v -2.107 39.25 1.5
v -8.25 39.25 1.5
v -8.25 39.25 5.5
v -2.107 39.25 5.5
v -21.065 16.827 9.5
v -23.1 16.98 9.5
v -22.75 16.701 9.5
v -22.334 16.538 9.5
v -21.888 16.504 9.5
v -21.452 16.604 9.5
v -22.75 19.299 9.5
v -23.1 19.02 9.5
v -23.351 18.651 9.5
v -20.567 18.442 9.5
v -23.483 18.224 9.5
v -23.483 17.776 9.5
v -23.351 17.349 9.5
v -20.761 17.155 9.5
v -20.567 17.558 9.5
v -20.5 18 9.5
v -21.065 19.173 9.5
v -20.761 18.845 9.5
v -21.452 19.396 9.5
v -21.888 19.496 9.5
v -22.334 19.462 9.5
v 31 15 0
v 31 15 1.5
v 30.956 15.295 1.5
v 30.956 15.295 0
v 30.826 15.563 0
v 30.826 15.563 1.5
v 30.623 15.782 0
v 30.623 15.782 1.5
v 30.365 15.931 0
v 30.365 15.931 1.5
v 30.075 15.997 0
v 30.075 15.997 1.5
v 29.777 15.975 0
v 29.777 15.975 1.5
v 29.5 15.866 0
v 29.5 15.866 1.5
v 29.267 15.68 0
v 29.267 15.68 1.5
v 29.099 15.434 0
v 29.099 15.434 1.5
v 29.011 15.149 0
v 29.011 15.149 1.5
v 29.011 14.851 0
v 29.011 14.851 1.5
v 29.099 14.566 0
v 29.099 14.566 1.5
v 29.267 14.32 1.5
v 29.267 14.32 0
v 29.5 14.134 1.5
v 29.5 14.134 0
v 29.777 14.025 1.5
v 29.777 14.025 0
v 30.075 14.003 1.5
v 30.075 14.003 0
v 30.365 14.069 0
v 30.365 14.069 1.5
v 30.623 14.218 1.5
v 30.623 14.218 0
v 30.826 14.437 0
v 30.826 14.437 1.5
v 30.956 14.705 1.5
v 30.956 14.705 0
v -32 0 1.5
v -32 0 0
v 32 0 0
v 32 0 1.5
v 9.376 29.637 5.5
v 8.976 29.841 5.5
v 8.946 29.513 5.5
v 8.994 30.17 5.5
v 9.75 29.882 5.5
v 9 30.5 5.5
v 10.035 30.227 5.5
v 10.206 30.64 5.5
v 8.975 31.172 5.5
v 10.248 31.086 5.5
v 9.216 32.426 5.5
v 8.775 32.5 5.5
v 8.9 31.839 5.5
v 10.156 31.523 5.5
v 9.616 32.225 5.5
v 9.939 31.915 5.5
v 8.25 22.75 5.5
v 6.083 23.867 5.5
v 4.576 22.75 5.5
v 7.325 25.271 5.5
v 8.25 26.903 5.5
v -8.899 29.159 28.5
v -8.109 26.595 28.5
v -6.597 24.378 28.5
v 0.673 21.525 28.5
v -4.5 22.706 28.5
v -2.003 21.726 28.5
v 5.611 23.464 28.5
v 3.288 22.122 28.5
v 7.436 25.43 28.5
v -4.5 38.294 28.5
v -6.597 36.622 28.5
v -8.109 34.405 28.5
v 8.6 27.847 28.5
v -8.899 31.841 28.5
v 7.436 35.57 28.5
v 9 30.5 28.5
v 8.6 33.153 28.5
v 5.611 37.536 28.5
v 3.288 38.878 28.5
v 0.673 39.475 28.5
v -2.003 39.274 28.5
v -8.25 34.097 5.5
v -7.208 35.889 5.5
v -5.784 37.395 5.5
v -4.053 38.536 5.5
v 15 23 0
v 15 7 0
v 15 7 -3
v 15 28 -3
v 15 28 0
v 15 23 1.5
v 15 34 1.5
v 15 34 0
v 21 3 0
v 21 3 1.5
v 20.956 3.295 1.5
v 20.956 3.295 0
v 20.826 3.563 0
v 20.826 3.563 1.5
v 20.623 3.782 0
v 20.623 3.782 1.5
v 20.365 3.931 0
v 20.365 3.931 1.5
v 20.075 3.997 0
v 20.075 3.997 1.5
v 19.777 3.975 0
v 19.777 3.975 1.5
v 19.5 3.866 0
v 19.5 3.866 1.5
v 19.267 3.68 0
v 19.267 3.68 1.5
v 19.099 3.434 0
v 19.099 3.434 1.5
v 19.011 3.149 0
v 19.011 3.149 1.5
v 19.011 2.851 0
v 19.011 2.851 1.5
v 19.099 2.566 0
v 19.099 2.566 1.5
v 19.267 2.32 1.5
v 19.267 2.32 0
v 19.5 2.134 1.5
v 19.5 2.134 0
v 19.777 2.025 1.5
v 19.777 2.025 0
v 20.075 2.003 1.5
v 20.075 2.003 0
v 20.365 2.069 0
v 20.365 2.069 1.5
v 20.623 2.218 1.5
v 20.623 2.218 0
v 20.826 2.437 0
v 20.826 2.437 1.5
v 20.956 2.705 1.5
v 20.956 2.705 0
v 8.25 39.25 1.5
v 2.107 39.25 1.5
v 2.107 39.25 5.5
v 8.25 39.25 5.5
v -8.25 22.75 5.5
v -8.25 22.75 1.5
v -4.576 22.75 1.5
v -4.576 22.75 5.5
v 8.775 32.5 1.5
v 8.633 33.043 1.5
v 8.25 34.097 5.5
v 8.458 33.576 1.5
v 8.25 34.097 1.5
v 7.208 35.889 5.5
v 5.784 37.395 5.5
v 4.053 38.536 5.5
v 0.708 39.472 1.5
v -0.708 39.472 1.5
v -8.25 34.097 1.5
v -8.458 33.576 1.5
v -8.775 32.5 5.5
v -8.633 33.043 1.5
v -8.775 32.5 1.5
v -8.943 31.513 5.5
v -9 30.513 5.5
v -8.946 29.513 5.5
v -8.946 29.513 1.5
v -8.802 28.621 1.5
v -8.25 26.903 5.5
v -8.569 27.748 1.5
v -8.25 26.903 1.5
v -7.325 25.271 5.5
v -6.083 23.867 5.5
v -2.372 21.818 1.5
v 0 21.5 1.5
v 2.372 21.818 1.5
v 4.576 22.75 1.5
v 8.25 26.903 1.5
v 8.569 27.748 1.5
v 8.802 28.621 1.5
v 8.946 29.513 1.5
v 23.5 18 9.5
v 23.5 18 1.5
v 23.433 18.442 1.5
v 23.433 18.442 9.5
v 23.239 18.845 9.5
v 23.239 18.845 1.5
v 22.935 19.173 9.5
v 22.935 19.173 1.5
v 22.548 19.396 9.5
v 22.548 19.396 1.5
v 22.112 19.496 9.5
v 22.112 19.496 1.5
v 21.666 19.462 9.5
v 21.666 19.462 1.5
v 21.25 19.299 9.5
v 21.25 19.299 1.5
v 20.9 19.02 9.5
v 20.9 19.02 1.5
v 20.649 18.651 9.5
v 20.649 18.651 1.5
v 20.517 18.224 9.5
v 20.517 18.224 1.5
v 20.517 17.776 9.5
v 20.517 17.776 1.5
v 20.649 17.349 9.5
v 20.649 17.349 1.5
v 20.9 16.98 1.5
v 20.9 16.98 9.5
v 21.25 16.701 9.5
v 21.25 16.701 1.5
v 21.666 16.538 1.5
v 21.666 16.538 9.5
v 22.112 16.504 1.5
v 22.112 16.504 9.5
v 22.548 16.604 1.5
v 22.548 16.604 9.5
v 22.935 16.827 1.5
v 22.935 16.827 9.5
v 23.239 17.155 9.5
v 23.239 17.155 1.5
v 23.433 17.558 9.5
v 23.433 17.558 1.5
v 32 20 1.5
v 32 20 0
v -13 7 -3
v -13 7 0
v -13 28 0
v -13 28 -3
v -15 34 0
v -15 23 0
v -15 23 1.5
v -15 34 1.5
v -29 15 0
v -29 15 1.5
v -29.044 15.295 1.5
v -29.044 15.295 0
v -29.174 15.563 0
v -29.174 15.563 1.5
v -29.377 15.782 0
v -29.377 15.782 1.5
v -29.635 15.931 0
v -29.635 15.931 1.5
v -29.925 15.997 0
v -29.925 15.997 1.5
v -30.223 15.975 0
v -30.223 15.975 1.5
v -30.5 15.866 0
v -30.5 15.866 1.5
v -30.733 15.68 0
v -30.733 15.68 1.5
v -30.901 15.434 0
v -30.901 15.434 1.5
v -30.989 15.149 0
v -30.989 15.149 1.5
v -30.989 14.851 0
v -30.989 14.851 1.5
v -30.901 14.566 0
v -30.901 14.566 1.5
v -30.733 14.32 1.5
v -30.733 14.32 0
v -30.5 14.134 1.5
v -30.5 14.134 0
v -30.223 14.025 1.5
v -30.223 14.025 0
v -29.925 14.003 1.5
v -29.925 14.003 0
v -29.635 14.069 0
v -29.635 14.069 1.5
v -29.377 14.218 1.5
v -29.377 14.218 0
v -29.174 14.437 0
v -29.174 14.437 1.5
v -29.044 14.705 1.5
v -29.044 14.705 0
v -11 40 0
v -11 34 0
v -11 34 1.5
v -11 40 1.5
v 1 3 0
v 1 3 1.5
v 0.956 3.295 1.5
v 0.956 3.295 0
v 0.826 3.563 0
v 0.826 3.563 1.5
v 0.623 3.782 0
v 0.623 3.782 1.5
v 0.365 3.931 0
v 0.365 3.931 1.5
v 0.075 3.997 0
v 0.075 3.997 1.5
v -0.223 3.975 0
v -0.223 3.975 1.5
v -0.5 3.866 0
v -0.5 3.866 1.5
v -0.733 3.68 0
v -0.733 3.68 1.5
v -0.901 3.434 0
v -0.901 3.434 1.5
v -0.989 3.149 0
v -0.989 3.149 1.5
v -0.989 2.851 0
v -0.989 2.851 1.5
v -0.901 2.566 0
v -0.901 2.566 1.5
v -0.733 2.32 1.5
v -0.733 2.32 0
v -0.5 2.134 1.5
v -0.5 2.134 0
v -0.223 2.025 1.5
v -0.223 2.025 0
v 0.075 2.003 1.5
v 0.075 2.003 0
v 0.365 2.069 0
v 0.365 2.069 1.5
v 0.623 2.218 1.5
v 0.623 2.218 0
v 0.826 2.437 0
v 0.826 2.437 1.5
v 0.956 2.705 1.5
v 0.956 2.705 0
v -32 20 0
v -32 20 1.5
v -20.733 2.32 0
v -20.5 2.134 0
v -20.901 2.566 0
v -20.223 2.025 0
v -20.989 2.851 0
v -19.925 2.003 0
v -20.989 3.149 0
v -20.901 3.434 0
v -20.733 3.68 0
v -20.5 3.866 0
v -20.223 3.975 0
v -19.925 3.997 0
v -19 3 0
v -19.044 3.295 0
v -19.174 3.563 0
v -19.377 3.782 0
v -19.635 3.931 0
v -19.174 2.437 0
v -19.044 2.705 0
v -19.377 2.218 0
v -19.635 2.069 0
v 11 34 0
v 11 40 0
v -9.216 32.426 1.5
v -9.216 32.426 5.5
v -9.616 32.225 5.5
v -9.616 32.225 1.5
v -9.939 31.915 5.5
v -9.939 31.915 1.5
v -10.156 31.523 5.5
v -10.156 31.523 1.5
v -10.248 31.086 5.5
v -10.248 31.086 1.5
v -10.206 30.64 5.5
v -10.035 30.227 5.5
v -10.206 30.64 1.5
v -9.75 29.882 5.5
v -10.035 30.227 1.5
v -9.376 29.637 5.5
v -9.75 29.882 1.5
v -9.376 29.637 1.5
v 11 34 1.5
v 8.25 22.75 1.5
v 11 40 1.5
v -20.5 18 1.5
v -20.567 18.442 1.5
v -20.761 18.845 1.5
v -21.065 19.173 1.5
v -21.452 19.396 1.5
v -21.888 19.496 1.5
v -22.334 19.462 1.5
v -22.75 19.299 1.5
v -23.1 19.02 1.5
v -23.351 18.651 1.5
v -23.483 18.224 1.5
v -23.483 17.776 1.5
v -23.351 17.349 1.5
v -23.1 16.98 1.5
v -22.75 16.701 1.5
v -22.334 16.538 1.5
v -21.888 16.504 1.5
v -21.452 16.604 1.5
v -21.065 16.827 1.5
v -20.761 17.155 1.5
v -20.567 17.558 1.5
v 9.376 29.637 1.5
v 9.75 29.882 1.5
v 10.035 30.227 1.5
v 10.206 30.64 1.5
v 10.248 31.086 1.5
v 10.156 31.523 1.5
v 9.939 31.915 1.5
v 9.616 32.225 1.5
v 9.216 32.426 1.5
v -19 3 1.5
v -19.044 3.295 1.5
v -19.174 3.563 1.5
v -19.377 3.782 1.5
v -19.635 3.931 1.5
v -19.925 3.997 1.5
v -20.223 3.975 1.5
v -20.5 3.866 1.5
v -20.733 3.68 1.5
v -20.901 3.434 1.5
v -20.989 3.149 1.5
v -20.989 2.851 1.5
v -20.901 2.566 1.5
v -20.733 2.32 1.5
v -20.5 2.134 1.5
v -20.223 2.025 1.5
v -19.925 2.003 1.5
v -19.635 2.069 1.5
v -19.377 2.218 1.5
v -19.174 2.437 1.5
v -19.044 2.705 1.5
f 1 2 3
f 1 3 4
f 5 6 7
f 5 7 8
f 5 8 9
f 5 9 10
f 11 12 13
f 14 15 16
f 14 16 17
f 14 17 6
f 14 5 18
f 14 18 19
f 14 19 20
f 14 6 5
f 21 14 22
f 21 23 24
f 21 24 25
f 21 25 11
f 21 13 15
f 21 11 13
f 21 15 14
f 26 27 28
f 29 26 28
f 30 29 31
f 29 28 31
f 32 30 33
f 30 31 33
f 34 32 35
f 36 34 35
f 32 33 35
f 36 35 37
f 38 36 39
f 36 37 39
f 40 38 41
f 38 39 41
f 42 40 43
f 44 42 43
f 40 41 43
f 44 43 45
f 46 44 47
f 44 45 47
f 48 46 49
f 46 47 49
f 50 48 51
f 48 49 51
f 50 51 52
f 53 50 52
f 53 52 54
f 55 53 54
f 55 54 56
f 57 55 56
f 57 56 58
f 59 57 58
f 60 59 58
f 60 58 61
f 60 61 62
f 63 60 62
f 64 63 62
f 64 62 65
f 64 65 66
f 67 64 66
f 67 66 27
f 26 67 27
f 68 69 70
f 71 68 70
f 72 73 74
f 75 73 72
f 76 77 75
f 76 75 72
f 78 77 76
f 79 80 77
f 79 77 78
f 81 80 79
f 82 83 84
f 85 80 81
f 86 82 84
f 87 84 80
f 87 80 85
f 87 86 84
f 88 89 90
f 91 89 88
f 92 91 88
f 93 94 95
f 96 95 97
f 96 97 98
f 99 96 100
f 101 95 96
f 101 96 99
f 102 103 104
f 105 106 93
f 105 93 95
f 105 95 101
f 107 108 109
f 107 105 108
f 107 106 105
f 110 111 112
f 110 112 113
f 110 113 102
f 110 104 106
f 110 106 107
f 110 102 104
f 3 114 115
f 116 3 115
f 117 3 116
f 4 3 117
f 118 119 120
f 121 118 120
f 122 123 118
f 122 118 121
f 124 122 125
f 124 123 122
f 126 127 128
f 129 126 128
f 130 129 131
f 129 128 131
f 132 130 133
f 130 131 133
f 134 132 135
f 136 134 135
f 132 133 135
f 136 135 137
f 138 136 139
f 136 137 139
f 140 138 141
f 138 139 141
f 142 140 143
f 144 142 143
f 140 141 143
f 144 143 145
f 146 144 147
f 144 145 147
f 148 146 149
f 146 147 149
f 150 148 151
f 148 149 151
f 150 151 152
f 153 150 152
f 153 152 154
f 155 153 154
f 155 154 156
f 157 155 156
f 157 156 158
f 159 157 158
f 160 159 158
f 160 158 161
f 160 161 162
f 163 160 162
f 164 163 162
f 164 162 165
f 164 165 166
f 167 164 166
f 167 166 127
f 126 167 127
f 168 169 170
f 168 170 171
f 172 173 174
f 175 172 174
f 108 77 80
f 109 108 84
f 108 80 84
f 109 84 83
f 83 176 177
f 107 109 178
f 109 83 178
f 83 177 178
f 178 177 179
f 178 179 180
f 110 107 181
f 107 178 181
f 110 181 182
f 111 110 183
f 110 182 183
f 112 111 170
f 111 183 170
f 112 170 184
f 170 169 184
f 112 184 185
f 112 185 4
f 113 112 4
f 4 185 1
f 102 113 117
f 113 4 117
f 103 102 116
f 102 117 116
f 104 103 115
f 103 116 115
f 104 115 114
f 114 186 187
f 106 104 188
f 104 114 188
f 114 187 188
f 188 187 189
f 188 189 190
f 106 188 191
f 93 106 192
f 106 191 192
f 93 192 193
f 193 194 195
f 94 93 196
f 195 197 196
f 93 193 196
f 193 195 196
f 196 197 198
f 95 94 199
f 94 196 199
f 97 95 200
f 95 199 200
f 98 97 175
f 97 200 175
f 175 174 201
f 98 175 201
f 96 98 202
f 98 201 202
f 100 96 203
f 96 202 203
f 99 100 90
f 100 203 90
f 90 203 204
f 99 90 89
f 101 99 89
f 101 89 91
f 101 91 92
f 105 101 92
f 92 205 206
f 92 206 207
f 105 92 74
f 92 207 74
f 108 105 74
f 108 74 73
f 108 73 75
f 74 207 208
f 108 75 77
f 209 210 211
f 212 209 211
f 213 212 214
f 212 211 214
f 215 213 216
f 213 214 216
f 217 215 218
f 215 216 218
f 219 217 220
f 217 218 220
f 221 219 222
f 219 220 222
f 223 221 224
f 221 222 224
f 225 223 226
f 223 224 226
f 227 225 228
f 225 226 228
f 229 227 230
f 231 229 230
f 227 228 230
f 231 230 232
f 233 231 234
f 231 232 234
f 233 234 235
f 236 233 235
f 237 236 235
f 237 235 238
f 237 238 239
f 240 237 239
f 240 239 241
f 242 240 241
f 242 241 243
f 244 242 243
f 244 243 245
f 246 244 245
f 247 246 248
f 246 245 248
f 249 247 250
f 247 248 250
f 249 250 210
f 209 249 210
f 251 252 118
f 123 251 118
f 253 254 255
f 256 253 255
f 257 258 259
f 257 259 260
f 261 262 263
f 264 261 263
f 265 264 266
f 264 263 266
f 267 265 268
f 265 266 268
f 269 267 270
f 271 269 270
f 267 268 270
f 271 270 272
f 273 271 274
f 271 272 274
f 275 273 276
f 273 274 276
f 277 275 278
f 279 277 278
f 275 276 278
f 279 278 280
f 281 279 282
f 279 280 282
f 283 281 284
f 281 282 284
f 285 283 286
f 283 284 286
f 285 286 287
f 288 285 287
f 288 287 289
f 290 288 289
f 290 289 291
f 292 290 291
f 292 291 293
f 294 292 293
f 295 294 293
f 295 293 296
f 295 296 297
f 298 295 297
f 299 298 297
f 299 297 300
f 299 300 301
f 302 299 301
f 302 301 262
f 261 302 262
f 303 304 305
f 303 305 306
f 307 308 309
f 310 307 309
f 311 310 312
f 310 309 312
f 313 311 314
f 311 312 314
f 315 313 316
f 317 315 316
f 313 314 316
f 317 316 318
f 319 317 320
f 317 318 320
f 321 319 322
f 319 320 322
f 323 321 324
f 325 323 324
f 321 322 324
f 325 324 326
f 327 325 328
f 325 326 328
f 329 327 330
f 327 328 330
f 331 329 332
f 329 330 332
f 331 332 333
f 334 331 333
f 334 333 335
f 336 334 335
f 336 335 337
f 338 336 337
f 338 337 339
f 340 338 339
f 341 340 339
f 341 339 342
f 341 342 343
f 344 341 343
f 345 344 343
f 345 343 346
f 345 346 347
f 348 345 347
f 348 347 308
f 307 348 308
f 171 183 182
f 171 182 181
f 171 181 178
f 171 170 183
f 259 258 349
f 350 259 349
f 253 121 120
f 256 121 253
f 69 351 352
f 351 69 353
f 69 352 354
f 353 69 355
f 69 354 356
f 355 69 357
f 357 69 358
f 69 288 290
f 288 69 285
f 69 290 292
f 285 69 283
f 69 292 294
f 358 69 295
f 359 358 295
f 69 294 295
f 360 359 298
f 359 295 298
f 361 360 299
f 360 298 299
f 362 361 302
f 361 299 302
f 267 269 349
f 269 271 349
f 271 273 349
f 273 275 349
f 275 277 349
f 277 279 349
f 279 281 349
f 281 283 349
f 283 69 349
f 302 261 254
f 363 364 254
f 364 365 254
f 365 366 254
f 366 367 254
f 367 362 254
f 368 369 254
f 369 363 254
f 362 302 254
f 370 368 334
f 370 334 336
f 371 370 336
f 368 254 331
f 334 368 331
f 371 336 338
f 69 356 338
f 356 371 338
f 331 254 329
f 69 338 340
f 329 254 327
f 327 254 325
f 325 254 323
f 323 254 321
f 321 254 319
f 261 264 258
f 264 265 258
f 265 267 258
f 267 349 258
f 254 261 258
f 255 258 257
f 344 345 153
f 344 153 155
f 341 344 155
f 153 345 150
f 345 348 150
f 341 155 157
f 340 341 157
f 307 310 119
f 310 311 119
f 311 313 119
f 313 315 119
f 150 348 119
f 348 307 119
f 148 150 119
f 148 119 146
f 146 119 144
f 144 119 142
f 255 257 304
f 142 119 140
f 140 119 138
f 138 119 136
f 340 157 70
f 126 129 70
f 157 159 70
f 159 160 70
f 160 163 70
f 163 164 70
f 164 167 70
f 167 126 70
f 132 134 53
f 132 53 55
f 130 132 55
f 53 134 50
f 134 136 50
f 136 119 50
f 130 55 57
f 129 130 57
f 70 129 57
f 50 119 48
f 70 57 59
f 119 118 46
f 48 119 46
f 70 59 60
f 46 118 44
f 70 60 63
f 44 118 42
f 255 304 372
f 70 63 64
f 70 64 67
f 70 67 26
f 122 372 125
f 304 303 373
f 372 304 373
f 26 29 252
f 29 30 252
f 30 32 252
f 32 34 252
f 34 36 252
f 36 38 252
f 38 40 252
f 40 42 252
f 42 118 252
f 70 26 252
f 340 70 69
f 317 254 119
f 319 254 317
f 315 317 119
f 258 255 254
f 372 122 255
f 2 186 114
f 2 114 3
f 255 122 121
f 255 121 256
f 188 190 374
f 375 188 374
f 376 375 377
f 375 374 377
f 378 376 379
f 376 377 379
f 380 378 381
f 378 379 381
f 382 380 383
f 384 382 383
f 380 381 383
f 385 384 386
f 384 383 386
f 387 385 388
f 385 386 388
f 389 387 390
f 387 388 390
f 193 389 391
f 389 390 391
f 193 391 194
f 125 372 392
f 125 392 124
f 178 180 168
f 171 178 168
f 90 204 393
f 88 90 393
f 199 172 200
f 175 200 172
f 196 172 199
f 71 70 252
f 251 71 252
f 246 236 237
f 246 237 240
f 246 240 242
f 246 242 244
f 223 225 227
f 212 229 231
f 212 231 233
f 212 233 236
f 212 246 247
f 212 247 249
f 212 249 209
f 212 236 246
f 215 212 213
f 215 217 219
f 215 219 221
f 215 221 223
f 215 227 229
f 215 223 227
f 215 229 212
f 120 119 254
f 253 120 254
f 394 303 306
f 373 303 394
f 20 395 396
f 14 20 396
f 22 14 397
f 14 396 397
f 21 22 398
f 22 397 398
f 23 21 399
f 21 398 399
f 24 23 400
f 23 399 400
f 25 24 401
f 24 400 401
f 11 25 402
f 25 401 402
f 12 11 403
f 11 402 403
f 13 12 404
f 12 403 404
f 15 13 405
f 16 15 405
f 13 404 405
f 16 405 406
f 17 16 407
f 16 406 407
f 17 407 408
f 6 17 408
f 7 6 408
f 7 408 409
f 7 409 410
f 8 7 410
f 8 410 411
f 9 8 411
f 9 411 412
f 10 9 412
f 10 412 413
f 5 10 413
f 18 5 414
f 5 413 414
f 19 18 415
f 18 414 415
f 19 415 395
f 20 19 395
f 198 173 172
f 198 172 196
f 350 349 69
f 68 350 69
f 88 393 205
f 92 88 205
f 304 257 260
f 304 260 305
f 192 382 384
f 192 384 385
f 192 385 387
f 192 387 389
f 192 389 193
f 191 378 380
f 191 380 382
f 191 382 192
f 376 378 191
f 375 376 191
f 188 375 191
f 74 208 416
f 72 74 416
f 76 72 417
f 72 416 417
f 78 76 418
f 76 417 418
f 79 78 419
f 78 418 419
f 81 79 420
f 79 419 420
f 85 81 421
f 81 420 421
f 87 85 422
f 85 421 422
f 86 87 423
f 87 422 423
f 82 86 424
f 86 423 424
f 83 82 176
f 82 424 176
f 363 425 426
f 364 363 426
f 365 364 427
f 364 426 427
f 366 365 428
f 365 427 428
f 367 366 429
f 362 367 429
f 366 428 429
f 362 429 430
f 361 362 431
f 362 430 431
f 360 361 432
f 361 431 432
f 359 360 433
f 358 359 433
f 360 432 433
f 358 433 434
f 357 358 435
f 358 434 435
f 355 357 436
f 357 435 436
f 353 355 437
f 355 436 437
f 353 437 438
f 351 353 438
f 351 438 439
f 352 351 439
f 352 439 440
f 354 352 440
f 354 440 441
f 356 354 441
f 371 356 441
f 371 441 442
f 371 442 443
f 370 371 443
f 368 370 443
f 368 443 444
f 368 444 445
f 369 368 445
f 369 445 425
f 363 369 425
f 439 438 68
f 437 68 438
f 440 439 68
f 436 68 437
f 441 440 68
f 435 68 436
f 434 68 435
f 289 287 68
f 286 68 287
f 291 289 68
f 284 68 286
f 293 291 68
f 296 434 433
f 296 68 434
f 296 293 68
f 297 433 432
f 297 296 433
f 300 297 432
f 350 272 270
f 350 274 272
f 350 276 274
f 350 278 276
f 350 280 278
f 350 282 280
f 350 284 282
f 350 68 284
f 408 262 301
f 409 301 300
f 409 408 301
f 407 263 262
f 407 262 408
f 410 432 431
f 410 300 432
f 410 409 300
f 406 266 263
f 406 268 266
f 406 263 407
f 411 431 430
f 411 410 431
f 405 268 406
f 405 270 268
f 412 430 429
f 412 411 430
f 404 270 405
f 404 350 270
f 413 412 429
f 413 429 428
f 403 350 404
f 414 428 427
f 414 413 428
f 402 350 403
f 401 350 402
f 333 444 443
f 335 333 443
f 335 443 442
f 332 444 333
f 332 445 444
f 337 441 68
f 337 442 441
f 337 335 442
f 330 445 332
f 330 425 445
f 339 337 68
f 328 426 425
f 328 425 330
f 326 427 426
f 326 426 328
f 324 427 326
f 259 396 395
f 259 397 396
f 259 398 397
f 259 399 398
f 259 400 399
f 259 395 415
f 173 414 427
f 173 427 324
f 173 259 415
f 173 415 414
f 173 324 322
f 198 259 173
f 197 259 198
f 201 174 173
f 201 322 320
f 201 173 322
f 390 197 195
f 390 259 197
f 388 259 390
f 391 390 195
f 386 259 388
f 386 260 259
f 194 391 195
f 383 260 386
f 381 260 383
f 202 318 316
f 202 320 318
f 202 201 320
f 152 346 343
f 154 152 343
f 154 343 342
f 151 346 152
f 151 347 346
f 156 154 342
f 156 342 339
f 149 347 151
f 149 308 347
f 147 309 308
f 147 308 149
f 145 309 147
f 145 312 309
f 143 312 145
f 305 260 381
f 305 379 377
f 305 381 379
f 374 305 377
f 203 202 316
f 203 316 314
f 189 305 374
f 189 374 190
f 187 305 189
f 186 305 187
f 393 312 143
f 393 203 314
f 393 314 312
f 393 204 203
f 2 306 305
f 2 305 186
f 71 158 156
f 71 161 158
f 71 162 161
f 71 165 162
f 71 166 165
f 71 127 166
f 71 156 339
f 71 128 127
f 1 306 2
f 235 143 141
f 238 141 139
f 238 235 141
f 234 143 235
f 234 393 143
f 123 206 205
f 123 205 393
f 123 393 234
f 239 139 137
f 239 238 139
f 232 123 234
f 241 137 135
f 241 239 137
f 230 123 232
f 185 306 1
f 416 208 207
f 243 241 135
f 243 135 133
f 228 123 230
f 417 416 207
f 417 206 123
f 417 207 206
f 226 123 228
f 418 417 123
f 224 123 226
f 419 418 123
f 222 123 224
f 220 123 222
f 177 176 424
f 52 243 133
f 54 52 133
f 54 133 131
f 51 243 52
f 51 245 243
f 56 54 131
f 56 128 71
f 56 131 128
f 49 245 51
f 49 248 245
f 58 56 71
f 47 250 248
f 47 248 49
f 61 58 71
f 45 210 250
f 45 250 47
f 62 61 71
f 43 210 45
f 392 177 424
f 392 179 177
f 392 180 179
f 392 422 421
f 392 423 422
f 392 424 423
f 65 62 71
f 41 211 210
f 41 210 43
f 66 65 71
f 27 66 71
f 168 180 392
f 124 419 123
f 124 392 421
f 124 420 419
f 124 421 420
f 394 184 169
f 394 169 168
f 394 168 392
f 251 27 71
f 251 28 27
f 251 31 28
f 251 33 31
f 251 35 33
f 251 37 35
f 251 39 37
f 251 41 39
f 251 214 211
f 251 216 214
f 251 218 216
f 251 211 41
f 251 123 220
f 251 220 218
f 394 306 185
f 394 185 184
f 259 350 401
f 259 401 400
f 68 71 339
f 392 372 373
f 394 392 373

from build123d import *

# Parameters (mm, degrees)
SKETCH1_W           = 30
SKETCH1_H           = 11
SKETCH1_W_2         = 22
SKETCH1_H_2         = 6
BOSS_EXTRUDE1_DEPTH = 1.5
SKETCH2_R           = 1
CUT_EXTRUDE1_DEPTH  = 5
SKETCH3_R           = 9
BOSS_EXTRUDE2_DEPTH = 27
SKETCH5_W           = 28
SKETCH5_H           = 21
BOSS_EXTRUDE3_DEPTH = 3
SKETCH6_R           = 1.5
BOSS_EXTRUDE4_DEPTH = 8
SKETCH7_R           = 1.5
SKETCH7_W           = 16.5
SKETCH7_H           = 16.5
BOSS_EXTRUDE5_DEPTH = 4


with BuildPart() as part:
    # Sketch1 → Boss-Extrude1 (new body)
    with BuildSketch(Plane.XY):
        Polygon((32, 0), (32, 20), (15, 23), (-15, 23), (-32, 20), (-32, 0), align=None)
        with Locations((0, 28.5)):
            Rectangle(SKETCH1_W, SKETCH1_H)
        with Locations((0, 37)):
            Rectangle(SKETCH1_W_2, SKETCH1_H_2)
    extrude(amount=BOSS_EXTRUDE1_DEPTH)

    # Sketch2 → Cut-Extrude1 (cut)
    with BuildSketch(Plane.XY.offset(1.5)):
        with Locations((20, 3)):
            Circle(SKETCH2_R)
        with Locations((0, 3)):
            Circle(SKETCH2_R)
        with Locations((-20, 3)):
            Circle(SKETCH2_R)
        with Locations((-30, 15)):
            Circle(SKETCH2_R)
        with Locations((30, 15)):
            Circle(SKETCH2_R)
    extrude(amount=-CUT_EXTRUDE1_DEPTH, mode=Mode.SUBTRACT)

    # Sketch3 → Boss-Extrude2 (add)
    with BuildSketch(Plane.XY.offset(1.5)):
        with Locations((0, 30.5)):
            Circle(SKETCH3_R)
    extrude(amount=BOSS_EXTRUDE2_DEPTH)

    # Sketch5 → Boss-Extrude3 (add)
    with BuildSketch(Plane(origin=(0, 0, 0), x_dir=(-1, 0, 0), z_dir=(0, 0, -1))):
        with Locations((-1, 17.5)):
            Rectangle(SKETCH5_W, SKETCH5_H)
    extrude(amount=BOSS_EXTRUDE3_DEPTH)

    # Sketch6 → Boss-Extrude4 (add)
    with BuildSketch(Plane.XY.offset(1.5)):
        with Locations((22, 18)):
            Circle(SKETCH6_R)
        with Locations((-22, 18)):
            Circle(SKETCH6_R)
    extrude(amount=BOSS_EXTRUDE4_DEPTH)

    # Sketch7 → Boss-Extrude5 (add)
    with BuildSketch(Plane.XY.offset(1.5)):
        with Locations((-8.75, 31)):
            Circle(SKETCH7_R)
        with Locations((8.75, 31)):
            Circle(SKETCH7_R)
        with Locations((0, 31)):
            Rectangle(SKETCH7_W, SKETCH7_H)
    extrude(amount=BOSS_EXTRUDE5_DEPTH)


solid = part.part
